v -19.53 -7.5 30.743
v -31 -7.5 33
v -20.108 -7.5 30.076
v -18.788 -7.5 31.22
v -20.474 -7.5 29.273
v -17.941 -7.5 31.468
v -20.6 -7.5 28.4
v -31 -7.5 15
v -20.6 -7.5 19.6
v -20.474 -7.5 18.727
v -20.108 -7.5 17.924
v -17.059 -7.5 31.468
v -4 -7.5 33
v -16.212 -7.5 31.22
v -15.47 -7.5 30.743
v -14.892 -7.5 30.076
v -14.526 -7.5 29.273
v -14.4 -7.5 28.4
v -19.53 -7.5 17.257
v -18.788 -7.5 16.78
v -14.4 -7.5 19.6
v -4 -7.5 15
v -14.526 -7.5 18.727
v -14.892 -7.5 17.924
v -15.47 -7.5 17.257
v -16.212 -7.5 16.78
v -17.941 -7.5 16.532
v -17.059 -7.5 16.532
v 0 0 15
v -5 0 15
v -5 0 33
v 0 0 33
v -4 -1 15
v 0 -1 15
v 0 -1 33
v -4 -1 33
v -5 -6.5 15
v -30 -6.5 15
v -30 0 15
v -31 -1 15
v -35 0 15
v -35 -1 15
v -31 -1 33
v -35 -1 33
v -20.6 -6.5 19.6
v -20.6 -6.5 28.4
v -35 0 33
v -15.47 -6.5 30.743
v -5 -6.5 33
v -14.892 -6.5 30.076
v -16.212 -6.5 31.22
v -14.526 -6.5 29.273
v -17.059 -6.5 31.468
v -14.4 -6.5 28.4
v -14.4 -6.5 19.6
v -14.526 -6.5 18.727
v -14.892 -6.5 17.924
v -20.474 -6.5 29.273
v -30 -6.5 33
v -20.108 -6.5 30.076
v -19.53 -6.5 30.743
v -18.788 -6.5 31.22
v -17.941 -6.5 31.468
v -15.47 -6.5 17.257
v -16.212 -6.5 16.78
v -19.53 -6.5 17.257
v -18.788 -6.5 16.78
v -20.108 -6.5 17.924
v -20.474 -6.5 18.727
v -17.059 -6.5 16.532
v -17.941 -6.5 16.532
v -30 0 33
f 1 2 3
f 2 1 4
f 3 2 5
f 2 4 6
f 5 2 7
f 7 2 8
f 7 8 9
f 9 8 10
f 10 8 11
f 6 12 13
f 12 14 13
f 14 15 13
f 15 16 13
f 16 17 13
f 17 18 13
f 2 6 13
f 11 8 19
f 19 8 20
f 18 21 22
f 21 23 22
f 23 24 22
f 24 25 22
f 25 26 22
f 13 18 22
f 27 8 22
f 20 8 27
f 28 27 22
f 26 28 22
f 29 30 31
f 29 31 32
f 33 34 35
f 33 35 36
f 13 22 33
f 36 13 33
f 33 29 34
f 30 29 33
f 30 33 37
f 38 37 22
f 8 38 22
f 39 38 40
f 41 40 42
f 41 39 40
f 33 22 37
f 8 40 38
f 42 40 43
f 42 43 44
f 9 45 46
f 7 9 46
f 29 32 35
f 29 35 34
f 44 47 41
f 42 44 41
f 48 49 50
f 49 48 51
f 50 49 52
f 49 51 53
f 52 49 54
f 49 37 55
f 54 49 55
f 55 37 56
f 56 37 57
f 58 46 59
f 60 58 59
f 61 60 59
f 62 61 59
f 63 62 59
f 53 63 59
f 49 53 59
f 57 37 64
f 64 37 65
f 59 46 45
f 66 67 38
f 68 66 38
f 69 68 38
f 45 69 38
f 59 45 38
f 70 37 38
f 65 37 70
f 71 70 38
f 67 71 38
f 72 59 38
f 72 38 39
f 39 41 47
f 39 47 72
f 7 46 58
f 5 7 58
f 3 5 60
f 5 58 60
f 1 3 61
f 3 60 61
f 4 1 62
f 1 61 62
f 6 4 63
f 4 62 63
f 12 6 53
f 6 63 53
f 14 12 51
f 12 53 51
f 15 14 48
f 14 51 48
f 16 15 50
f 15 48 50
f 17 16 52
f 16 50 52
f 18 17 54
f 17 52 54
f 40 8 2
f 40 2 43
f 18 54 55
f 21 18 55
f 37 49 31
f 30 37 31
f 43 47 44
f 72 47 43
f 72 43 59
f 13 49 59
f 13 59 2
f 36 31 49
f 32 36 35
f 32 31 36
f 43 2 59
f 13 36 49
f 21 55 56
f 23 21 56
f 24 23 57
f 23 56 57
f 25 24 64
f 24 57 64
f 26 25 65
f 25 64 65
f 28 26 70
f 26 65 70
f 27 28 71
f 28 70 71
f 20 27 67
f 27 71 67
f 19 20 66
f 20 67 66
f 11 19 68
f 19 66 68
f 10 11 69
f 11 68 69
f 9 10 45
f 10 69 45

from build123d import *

# Parameters (mm, degrees)
SKETCH1_W           = 35
SKETCH1_H           = 175
BOSS_EXTRUDE1_DEPTH = 7.5
SKETCH2_W           = 25
SKETCH2_H           = 6.5
CUT_EXTRUDE1_DEPTH  = 179.623206779
CUT_EXTRUDE2_DEPTH  = 179.623206779
SKETCH4_W           = 4
SKETCH4_H           = 6.5
CUT_EXTRUDE3_DEPTH  = 179.623206779
SKETCH5_W           = 4
SKETCH5_H           = 6.5
CUT_EXTRUDE4_DEPTH  = 179.623206779
CUT_EXTRUDE5_DEPTH  = 179.623206779
CUT_EXTRUDE6_DEPTH  = 179.584013842
CUT_EXTRUDE7_DEPTH  = 179.584013842
CUT_EXTRUDE8_DEPTH  = 179.584013842
CUT_EXTRUDE9_DEPTH  = 179.584013842
CUT_EXTRUDE10_DEPTH = 179.584013842
CUT_EXTRUDE11_DEPTH = 179.623206779
SKETCH13_W          = 54.072725276
SKETCH13_H          = 30.837150003
CUT_EXTRUDE12_DEPTH = 15
SKETCH14_W          = 49.0024185
SKETCH14_H          = 27.053522809
CUT_EXTRUDE13_DEPTH = 142


with BuildPart() as part:
    # Sketch1 → Boss-Extrude1 (new body)
    with BuildSketch(Plane(origin=(0, 0, 0), x_dir=(1, 0, 0), z_dir=(0, 1, 0))):
        with Locations((-17.5, -87.5)):
            Rectangle(SKETCH1_W, SKETCH1_H)
    extrude(amount=-BOSS_EXTRUDE1_DEPTH)

    # Sketch2 → Cut-Extrude1 (cut, through all)
    with BuildSketch(Plane(origin=(0, 0, 0), x_dir=(-1, 0, 0), z_dir=(0, 0, -1))):
        with Locations((17.5, -3.25)):
            Rectangle(SKETCH2_W, SKETCH2_H)
    extrude(amount=-CUT_EXTRUDE1_DEPTH, mode=Mode.SUBTRACT)

    # Sketch3 → Cut-Extrude2 (cut, through all)
    with BuildSketch(Plane.XZ.offset(7.5)):
        with BuildLine():
            Line((-20.6, 0), (-14.4, 0))
            Line((-14.4, 0), (-14.4, 3.4))
            ThreePointArc((-14.4, 3.4), (-17.5, 6.5), (-20.6, 3.4))
            Line((-20.6, 3.4), (-20.6, 0))
        make_face()
    extrude(amount=-CUT_EXTRUDE2_DEPTH, mode=Mode.SUBTRACT)

    # Sketch4 → Cut-Extrude3 (cut, through all)
    with BuildSketch(Plane(origin=(0, 0, 0), x_dir=(-1, 0, 0), z_dir=(0, 0, -1))):
        with Locations((33, -4.25)):
            Rectangle(SKETCH4_W, SKETCH4_H)
    extrude(amount=-CUT_EXTRUDE3_DEPTH, mode=Mode.SUBTRACT)

    # Sketch5 → Cut-Extrude4 (cut, through all)
    with BuildSketch(Plane(origin=(0, 0, 0), x_dir=(-1, 0, 0), z_dir=(0, 0, -1))):
        with Locations((2, -4.25)):
            Rectangle(SKETCH5_W, SKETCH5_H)
    extrude(amount=-CUT_EXTRUDE4_DEPTH, mode=Mode.SUBTRACT)

    # Sketch6 → Cut-Extrude5 (cut, through all)
    with BuildSketch(Plane.XZ.offset(7.5)):
        with BuildLine():
            Line((-14.4, 175), (-20.6, 175))
            Line((-20.6, 175), (-20.6, 169.6))
            ThreePointArc((-20.6, 169.6), (-17.5, 166.5), (-14.4, 169.6))
            Line((-14.4, 169.6), (-14.4, 175))
        make_face()
    extrude(amount=-CUT_EXTRUDE5_DEPTH, mode=Mode.SUBTRACT)

    # Sketch7 → Cut-Extrude6 (cut, through all)
    with BuildSketch(Plane(origin=(0, -6.5, 0), x_dir=(-1, 0, 0), z_dir=(0, 1, 0))):
        with BuildLine():
            Line((14.4, 103.4), (14.4, 94.6))
            ThreePointArc((14.4, 94.6), (17.5, 91.5), (20.6, 94.6))
            Line((20.6, 94.6), (20.6, 103.4))
            ThreePointArc((20.6, 103.4), (17.5, 106.5), (14.4, 103.4))
        make_face()
    extrude(amount=-CUT_EXTRUDE6_DEPTH, mode=Mode.SUBTRACT)

    # Sketch8 → Cut-Extrude7 (cut, through all)
    with BuildSketch(Plane(origin=(0, -6.5, 0), x_dir=(-1, 0, 0), z_dir=(0, 1, 0))):
        with BuildLine():
            Line((14.4, 78.4), (14.4, 69.6))
            ThreePointArc((14.4, 69.6), (17.5, 66.5), (20.6, 69.6))
            Line((20.6, 69.6), (20.6, 78.4))
            ThreePointArc((20.6, 78.4), (17.5, 81.5), (14.4, 78.4))
        make_face()
    extrude(amount=-CUT_EXTRUDE7_DEPTH, mode=Mode.SUBTRACT)

    # Sketch9 → Cut-Extrude8 (cut, through all)
    with BuildSketch(Plane(origin=(0, -6.5, 0), x_dir=(-1, 0, 0), z_dir=(0, 1, 0))):
        with BuildLine():
            Line((14.4, 28.4), (14.4, 19.6))
            ThreePointArc((14.4, 19.6), (17.5, 16.5), (20.6, 19.6))
            Line((20.6, 19.6), (20.6, 28.4))
            ThreePointArc((20.6, 28.4), (17.5, 31.5), (14.4, 28.4))
        make_face()
    extrude(amount=-CUT_EXTRUDE8_DEPTH, mode=Mode.SUBTRACT)

    # Sketch10 → Cut-Extrude9 (cut, through all)
    with BuildSketch(Plane(origin=(0, -6.5, 0), x_dir=(-1, 0, 0), z_dir=(0, 1, 0))):
        with BuildLine():
            Line((14.4, 153.4), (14.4, 144.6))
            ThreePointArc((14.4, 144.6), (17.5, 141.5), (20.6, 144.6))
            Line((20.6, 144.6), (20.6, 153.4))
            ThreePointArc((20.6, 153.4), (17.5, 156.5), (14.4, 153.4))
        make_face()
    extrude(amount=-CUT_EXTRUDE9_DEPTH, mode=Mode.SUBTRACT)

    # Sketch11 → Cut-Extrude10 (cut, through all)
    with BuildSketch(Plane(origin=(0, -6.5, 0), x_dir=(-1, 0, 0), z_dir=(0, 1, 0))):
        with BuildLine():
            Line((14.4, 128.4), (14.4, 119.6))
            ThreePointArc((14.4, 119.6), (17.5, 116.5), (20.6, 119.6))
            Line((20.6, 119.6), (20.6, 128.4))
            ThreePointArc((20.6, 128.4), (17.5, 131.5), (14.4, 128.4))
        make_face()
    extrude(amount=-CUT_EXTRUDE10_DEPTH, mode=Mode.SUBTRACT)

    # Sketch12 → Cut-Extrude11 (cut, through all)
    with BuildSketch(Plane.XZ.offset(7.5)):
        with BuildLine():
            Line((-20.6, 53.4), (-20.6, 44.6))
            ThreePointArc((-20.6, 44.6), (-17.5, 41.5), (-14.4, 44.6))
            Line((-14.4, 44.6), (-14.4, 53.4))
            ThreePointArc((-14.4, 53.4), (-17.5, 56.5), (-20.6, 53.4))
        make_face()
    extrude(amount=-CUT_EXTRUDE11_DEPTH, mode=Mode.SUBTRACT)

    # Sketch13 → Cut-Extrude12 (cut)
    with BuildSketch(Plane(origin=(0, 0, 0), x_dir=(-1, 0, 0), z_dir=(0, 0, -1))):
        with Locations((12.505255608, -4.443731482)):
            Rectangle(SKETCH13_W, SKETCH13_H)
    extrude(amount=-CUT_EXTRUDE12_DEPTH, mode=Mode.SUBTRACT)

    # Sketch14 → Cut-Extrude13 (cut)
    with BuildSketch(Plane.XY.offset(175)):
        with Locations((-15.887003793, 1.102839907)):
            Rectangle(SKETCH14_W, SKETCH14_H)
    extrude(amount=-CUT_EXTRUDE13_DEPTH, mode=Mode.SUBTRACT)


solid = part.part
